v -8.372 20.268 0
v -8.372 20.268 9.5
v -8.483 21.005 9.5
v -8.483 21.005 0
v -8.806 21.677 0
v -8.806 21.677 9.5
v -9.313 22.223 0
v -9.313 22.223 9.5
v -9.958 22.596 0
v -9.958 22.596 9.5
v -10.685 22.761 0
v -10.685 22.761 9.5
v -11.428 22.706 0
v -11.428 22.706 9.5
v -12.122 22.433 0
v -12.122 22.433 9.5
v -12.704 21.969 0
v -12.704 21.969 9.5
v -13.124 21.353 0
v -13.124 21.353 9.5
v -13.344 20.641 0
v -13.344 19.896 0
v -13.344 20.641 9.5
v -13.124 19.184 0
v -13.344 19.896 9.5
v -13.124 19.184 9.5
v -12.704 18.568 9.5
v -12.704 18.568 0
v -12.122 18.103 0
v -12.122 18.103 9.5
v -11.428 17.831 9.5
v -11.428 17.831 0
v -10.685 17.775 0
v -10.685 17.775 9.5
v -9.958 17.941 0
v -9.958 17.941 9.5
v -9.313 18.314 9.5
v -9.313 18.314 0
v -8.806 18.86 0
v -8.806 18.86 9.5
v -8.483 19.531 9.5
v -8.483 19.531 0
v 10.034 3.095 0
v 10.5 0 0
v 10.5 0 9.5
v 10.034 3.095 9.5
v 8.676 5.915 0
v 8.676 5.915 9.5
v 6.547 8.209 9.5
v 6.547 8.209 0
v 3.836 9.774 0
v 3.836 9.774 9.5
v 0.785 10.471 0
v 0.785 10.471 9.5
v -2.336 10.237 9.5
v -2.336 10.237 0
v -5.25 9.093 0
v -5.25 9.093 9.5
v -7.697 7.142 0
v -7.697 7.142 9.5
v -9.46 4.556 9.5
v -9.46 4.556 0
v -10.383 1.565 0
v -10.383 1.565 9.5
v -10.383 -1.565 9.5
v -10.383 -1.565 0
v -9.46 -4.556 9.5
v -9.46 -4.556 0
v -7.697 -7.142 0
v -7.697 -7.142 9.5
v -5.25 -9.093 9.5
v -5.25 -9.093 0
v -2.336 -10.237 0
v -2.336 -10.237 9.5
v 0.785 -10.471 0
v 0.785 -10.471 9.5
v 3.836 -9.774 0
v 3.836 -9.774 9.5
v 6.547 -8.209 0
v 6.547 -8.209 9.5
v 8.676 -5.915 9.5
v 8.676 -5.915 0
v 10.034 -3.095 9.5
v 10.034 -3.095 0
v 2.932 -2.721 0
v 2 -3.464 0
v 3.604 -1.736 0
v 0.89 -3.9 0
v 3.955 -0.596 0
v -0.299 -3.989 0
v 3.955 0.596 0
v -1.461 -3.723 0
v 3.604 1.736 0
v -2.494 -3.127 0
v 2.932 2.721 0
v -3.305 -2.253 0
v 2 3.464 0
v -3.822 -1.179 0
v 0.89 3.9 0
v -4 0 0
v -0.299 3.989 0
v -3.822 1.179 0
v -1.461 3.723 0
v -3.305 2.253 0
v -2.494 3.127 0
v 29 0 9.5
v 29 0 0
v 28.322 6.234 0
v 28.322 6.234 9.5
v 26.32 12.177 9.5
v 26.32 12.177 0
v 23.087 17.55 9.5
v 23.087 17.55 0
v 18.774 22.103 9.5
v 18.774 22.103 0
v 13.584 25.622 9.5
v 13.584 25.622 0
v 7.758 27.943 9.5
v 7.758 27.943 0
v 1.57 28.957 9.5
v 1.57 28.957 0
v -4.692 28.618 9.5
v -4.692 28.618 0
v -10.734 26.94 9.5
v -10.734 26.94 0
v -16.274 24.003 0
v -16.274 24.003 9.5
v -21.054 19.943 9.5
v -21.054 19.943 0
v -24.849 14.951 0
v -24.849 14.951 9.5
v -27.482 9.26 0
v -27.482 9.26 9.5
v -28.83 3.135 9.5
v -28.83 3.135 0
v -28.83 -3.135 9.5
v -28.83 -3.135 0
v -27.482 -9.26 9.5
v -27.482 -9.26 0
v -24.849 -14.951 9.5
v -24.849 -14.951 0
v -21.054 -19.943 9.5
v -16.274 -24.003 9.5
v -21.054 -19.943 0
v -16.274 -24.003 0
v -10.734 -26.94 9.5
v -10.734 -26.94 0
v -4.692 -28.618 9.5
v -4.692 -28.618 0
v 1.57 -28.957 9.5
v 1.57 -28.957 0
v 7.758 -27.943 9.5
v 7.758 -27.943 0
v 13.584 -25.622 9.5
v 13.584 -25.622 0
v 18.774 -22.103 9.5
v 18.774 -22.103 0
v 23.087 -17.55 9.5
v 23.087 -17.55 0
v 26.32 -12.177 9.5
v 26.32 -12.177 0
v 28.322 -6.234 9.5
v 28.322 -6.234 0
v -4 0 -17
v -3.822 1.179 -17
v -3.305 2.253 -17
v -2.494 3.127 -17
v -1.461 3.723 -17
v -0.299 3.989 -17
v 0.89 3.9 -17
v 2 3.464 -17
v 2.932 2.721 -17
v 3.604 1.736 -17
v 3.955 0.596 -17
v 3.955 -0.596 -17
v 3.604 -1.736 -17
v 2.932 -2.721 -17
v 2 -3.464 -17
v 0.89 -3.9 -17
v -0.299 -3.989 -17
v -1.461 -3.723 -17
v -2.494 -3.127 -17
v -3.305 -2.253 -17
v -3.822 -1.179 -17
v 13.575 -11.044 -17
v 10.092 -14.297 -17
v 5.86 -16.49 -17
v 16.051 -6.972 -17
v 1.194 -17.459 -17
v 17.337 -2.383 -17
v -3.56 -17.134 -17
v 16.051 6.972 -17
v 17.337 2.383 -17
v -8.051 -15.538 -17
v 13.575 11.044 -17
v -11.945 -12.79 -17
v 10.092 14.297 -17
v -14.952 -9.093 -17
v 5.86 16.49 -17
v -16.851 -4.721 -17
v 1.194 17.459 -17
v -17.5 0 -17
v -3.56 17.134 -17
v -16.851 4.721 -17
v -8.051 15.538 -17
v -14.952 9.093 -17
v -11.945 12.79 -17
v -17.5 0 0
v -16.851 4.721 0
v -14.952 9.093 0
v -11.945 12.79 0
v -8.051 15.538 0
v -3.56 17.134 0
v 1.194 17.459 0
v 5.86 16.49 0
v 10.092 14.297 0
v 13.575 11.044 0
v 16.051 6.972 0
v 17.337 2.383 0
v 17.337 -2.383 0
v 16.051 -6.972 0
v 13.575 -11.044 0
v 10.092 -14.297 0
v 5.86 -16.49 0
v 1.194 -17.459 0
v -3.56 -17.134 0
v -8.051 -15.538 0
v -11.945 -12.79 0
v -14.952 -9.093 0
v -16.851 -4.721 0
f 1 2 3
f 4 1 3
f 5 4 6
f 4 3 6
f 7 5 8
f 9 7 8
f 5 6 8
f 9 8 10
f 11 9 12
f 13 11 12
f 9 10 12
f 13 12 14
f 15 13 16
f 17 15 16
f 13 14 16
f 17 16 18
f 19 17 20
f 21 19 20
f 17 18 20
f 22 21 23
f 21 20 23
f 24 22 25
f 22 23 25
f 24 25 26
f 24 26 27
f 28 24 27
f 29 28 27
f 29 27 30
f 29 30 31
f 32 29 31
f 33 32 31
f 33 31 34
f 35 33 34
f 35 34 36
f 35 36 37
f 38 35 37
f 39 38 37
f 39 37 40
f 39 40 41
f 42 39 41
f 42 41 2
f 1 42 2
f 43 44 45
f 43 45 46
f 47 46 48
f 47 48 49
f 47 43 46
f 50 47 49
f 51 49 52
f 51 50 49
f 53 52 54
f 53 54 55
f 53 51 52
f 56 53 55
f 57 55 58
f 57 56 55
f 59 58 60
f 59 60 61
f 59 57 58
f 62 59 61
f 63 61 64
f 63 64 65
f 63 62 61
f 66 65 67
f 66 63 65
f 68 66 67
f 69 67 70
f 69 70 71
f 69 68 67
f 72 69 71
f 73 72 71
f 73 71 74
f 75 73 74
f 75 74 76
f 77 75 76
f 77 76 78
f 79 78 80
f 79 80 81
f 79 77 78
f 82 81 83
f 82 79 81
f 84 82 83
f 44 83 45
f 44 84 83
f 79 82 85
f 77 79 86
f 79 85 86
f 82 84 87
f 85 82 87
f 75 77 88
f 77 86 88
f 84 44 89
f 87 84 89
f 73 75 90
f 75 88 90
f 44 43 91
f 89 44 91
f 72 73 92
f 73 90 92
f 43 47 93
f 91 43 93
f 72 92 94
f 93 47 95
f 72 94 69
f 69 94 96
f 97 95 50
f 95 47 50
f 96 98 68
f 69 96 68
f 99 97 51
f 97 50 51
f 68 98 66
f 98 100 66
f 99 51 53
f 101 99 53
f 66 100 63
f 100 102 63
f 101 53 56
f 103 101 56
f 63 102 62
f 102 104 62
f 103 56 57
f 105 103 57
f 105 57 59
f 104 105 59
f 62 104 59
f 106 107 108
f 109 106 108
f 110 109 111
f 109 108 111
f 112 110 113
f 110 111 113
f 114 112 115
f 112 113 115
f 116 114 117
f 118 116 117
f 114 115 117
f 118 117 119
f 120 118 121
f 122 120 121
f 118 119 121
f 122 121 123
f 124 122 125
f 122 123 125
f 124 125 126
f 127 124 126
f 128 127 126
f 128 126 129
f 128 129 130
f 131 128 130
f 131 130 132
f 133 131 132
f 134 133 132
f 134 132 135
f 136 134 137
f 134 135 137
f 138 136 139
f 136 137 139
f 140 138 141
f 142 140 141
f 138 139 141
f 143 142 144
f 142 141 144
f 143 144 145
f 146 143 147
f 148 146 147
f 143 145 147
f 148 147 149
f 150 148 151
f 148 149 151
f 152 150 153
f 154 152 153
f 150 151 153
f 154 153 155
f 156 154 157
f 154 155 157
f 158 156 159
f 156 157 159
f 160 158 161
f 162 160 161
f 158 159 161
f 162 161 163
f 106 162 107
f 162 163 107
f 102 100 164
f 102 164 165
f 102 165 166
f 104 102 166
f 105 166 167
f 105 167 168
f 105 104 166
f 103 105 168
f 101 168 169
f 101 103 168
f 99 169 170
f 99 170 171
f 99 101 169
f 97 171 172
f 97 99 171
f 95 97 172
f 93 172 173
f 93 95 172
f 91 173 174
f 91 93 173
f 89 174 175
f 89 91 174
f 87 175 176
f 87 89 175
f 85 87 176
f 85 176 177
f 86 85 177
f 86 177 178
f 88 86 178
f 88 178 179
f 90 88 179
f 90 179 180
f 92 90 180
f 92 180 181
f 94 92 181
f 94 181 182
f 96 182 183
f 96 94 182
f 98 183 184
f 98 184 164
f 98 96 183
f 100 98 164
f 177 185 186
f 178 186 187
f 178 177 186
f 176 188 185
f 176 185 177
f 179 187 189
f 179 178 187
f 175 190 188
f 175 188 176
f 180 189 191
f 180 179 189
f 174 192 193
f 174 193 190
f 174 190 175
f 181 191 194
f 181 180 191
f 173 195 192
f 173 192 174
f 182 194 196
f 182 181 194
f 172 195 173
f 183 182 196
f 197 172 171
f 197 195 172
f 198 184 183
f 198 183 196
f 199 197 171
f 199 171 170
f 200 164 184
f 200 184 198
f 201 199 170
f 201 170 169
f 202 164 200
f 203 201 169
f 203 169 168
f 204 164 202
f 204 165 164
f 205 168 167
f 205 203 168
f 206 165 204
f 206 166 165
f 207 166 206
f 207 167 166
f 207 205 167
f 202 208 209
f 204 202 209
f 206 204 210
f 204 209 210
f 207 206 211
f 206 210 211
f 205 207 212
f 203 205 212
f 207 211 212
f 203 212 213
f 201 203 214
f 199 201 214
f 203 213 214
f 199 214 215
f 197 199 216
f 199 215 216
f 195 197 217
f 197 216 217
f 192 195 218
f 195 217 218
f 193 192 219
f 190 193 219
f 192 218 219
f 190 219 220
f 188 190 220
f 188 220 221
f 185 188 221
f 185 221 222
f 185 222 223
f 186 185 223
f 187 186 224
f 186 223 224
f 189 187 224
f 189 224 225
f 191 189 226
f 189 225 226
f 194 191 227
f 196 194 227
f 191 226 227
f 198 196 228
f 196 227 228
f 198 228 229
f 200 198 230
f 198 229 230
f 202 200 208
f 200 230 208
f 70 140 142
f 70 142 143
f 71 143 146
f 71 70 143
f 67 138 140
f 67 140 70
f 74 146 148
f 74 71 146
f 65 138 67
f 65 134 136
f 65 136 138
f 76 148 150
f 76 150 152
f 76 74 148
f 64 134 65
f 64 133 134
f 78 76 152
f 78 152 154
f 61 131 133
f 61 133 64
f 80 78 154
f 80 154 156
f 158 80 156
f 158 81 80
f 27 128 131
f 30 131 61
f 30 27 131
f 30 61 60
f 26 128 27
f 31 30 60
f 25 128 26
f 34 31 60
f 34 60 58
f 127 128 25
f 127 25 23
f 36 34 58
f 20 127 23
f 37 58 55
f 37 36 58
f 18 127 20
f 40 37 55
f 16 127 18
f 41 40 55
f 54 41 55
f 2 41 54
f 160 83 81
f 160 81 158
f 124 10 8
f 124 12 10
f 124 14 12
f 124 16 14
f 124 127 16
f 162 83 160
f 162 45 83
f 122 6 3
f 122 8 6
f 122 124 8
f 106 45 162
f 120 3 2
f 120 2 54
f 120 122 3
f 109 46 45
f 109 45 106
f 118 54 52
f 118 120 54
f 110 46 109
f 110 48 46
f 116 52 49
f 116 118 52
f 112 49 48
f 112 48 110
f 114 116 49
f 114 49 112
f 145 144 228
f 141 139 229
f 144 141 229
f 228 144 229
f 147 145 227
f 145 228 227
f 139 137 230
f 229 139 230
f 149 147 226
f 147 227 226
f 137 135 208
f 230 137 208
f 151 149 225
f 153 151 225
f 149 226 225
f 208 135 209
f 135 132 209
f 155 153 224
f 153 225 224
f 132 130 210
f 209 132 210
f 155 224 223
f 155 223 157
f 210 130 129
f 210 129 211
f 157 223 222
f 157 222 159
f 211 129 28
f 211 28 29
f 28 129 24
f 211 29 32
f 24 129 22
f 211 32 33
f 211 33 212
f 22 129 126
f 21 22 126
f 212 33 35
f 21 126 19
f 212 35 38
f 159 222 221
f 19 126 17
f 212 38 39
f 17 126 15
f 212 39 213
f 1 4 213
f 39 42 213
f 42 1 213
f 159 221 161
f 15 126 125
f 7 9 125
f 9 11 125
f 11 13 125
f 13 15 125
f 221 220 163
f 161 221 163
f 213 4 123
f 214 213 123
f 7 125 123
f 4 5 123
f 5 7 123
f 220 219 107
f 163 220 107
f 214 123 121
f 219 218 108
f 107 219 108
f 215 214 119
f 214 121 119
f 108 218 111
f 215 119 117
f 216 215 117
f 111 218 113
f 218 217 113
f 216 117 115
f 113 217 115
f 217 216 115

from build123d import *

# Parameters (mm, degrees)
SKETCH_1_R          = 29
SKETCH_1_R_2        = 10.5
EXTRUDE_1_DEPTH     = 9.5
SKETCH_2_R          = 17.5
SKETCH_2_R_2        = 4
EXTRUDE_2_DEPTH     = 17
SKETCH_3_R          = 2.5
CUT_EXTRUDE_1_DEPTH = 17


with BuildPart() as part:
    # Эскиз1 → Бобышка-Вытянуть1 (new body)
    with BuildSketch(Plane.XY):
        Circle(SKETCH_1_R)
        Circle(SKETCH_1_R_2, mode=Mode.SUBTRACT)
    extrude(amount=EXTRUDE_1_DEPTH)

    # Эскиз2 → Бобышка-Вытянуть2 (add)
    with BuildSketch(Plane(origin=(0, 0, 0), x_dir=(-1, 0, 0), z_dir=(0, 0, -1))):
        Circle(SKETCH_2_R)
        Circle(SKETCH_2_R_2, mode=Mode.SUBTRACT)
    extrude(amount=EXTRUDE_2_DEPTH)

    # Эскиз3 → Вырез-Вытянуть1 (cut)
    with BuildSketch(Plane.XY.offset(9.5)):
        with Locations((-10.871713138, 20.268346096)):
            Circle(SKETCH_3_R)
    extrude(amount=-CUT_EXTRUDE_1_DEPTH, mode=Mode.SUBTRACT)


solid = part.part
